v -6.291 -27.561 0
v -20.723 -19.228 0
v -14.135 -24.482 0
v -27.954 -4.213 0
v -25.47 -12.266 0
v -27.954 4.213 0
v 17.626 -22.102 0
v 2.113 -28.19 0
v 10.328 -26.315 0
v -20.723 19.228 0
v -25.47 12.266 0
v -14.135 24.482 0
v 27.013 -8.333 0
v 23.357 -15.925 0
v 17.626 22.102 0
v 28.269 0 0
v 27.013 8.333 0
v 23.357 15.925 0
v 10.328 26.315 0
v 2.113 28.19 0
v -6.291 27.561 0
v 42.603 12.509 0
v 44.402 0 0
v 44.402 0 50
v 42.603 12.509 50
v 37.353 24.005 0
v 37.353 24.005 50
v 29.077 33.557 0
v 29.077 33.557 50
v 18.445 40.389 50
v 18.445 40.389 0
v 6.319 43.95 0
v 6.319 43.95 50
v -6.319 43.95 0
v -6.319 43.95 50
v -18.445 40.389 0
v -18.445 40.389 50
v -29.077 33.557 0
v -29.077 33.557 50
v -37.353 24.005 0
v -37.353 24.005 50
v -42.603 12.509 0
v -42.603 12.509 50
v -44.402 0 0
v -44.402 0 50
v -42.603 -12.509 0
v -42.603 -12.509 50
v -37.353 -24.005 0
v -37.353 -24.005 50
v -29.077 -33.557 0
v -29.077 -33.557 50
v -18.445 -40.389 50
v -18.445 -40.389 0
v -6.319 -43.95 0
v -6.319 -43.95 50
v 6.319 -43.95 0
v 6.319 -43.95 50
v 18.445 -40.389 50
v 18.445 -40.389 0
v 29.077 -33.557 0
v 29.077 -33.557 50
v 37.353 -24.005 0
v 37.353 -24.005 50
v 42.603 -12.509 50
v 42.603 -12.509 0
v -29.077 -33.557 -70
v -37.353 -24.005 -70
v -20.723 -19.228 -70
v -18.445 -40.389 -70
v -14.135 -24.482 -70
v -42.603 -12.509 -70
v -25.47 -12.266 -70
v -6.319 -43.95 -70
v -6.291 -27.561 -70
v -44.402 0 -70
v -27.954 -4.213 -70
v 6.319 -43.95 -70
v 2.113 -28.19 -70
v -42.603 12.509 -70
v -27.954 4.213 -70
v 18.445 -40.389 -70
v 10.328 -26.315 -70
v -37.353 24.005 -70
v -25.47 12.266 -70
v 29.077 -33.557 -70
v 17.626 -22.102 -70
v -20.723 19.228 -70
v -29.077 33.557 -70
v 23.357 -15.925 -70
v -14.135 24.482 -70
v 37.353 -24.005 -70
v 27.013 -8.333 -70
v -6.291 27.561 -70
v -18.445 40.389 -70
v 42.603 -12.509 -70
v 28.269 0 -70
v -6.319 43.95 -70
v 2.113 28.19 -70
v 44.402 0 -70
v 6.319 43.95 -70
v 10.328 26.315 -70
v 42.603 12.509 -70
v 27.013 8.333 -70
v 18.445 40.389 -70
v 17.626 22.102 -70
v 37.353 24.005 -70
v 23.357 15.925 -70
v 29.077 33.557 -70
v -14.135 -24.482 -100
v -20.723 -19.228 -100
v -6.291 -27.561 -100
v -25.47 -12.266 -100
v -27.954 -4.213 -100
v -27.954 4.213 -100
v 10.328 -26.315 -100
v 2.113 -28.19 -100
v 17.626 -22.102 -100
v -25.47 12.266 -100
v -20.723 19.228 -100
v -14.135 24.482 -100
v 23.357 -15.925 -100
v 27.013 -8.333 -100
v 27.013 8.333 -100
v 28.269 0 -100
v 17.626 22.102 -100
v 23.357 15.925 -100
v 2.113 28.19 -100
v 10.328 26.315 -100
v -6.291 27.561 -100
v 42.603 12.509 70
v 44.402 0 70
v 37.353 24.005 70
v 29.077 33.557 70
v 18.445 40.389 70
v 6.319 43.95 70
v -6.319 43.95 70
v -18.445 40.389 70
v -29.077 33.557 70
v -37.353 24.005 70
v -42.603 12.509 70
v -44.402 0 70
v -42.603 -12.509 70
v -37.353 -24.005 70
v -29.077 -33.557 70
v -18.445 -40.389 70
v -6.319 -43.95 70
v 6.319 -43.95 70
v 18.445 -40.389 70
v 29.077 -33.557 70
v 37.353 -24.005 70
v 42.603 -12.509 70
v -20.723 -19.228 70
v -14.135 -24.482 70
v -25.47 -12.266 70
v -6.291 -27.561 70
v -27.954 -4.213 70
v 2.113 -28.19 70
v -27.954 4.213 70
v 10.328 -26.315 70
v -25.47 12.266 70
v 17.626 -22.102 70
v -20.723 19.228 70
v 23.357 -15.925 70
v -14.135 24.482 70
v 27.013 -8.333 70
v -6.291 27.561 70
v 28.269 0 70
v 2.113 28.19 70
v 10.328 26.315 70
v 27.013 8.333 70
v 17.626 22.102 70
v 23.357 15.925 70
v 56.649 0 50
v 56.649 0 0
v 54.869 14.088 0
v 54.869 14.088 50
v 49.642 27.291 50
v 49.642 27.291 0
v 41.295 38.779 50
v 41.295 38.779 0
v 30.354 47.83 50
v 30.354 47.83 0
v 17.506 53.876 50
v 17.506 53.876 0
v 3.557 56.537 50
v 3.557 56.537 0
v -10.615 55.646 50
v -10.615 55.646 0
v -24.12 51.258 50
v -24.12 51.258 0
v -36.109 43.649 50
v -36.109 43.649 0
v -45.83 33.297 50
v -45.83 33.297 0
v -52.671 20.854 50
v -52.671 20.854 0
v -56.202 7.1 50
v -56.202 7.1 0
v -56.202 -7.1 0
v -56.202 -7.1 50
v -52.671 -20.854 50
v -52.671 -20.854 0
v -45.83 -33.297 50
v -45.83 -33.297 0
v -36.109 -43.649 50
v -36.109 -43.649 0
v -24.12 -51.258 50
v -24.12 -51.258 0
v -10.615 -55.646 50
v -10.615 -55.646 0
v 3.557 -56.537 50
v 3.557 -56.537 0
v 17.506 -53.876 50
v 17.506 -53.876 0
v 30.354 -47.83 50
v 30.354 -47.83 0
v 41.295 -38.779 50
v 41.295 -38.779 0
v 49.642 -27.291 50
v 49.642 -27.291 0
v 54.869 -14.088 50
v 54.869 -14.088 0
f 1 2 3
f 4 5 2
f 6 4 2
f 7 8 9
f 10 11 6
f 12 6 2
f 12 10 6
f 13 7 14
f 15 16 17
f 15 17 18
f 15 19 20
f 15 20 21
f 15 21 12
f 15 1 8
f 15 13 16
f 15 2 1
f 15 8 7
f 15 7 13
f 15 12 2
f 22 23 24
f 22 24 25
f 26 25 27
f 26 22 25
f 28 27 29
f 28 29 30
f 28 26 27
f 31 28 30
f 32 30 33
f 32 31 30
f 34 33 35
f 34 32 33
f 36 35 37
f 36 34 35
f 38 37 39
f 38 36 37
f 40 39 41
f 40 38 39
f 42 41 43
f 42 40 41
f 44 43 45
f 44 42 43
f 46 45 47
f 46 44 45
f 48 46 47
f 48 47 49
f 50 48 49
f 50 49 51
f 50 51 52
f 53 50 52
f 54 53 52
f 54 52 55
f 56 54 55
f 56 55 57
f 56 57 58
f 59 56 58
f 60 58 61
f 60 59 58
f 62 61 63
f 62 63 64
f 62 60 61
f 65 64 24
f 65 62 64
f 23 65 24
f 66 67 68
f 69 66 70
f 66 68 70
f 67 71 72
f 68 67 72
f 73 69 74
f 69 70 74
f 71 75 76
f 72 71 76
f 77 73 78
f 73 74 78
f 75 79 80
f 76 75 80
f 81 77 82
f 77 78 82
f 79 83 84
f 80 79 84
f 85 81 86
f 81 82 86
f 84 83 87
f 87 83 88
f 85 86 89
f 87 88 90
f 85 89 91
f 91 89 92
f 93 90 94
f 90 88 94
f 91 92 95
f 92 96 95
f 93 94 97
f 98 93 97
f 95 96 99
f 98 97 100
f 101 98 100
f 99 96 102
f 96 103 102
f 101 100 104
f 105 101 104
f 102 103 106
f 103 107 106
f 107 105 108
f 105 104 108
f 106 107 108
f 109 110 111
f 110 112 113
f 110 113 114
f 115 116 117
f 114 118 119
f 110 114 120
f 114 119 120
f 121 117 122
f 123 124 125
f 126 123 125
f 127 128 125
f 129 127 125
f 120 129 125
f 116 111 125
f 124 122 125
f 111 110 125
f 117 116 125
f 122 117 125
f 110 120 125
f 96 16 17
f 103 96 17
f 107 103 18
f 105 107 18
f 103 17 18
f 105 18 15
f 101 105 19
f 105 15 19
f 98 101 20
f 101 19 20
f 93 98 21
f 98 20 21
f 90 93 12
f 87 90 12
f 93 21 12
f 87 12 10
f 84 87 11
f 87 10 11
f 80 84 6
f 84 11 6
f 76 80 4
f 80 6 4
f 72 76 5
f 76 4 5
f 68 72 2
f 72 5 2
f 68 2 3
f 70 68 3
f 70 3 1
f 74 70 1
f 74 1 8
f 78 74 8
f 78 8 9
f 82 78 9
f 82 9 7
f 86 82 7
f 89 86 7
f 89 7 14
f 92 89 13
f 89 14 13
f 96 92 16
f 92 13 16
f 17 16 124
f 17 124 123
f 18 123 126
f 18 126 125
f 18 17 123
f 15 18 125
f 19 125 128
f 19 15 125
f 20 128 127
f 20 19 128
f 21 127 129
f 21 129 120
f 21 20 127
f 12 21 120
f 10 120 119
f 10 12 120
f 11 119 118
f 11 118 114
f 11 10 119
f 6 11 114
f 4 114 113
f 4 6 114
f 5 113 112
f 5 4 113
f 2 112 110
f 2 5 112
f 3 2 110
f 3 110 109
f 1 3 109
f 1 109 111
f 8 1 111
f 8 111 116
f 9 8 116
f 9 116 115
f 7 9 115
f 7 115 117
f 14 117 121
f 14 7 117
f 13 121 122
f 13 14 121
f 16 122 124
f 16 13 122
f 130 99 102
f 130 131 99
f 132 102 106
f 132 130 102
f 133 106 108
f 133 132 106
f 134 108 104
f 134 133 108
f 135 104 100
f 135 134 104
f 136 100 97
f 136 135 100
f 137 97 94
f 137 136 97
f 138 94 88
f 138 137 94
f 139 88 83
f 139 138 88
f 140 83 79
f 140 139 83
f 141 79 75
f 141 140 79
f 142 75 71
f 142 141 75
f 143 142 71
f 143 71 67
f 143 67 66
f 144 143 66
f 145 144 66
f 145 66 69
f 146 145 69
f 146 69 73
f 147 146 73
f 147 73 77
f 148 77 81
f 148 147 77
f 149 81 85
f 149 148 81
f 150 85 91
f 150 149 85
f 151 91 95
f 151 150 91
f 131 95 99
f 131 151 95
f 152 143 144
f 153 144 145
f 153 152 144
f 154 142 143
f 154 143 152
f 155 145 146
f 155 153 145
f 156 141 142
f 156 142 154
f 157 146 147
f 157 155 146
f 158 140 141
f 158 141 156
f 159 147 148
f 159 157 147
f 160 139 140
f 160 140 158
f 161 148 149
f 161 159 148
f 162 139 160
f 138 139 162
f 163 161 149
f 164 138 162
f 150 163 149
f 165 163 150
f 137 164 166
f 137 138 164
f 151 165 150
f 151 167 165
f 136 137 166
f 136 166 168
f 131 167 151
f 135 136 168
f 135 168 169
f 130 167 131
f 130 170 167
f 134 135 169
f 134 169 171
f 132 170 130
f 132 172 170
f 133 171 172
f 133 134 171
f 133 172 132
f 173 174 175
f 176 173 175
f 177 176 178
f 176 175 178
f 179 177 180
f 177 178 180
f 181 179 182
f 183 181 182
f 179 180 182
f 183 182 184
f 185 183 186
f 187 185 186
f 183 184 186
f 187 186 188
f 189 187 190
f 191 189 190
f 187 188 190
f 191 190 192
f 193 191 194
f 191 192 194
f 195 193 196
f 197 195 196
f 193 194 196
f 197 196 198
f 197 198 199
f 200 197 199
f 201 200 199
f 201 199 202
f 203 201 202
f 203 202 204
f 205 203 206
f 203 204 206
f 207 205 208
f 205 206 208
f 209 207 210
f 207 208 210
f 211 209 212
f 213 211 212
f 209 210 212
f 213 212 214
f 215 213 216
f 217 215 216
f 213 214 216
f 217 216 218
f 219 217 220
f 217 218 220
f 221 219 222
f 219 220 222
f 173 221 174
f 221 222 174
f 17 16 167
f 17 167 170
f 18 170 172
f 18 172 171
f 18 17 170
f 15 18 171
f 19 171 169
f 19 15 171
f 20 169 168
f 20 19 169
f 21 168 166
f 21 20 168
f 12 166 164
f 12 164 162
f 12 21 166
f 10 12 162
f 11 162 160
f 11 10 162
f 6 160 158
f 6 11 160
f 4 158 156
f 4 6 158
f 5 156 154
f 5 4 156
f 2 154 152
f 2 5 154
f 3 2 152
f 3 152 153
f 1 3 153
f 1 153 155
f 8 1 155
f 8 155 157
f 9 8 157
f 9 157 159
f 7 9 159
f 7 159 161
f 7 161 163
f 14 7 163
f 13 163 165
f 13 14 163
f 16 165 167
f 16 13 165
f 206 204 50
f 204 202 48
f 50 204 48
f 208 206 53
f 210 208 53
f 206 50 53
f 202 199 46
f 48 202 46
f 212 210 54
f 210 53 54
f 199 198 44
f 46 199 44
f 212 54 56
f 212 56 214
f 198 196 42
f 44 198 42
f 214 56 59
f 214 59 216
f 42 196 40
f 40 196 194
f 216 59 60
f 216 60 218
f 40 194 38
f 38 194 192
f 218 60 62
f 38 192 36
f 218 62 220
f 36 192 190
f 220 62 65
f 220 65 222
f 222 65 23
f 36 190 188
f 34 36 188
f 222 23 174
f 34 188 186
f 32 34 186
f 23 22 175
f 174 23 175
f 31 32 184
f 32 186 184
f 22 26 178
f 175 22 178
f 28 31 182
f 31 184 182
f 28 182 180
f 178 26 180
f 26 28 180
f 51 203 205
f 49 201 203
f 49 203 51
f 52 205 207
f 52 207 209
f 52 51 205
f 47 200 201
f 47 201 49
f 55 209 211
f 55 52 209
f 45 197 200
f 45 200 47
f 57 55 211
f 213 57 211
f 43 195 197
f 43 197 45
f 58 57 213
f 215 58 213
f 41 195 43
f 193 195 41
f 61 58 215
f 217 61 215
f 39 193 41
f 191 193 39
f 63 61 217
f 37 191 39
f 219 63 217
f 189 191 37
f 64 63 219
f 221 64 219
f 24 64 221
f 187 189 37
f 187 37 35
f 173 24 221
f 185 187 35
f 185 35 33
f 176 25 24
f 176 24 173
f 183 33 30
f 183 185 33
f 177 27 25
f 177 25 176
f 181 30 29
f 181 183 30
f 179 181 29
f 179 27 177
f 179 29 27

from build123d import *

# Parameters (mm, degrees)
F0_R          = 56.648999
F0_R_2        = 44.401671
F1_DEPTH      = 50
F0_R_3        = 28.269419
F2_DEPTH      = 100
F3_DEPTH      = 70
F3_DEPTH_BACK = 70


with BuildPart() as f1:
    # F0 (on Top) → F1 (new body)
    with BuildSketch(Plane.XY):
        Circle(F0_R)
        Circle(F0_R_2, mode=Mode.SUBTRACT)
    extrude(amount=F1_DEPTH)


with BuildPart() as f2:
    # F0 (on Top) → F2 (new body)
    with BuildSketch(Plane.XY):
        Circle(F0_R_3)
    extrude(amount=-F2_DEPTH)


with BuildPart() as f3:
    # F0 (on Top) → F3 (new body, two sides)
    with BuildSketch(Plane.XY) as f3_sk:
        Circle(F0_R_2)
        Circle(F0_R_3, mode=Mode.SUBTRACT)
    extrude(amount=F3_DEPTH)
    extrude(f3_sk.sketch, amount=-F3_DEPTH_BACK)


solid = Compound([f1.part, f2.part, f3.part])
